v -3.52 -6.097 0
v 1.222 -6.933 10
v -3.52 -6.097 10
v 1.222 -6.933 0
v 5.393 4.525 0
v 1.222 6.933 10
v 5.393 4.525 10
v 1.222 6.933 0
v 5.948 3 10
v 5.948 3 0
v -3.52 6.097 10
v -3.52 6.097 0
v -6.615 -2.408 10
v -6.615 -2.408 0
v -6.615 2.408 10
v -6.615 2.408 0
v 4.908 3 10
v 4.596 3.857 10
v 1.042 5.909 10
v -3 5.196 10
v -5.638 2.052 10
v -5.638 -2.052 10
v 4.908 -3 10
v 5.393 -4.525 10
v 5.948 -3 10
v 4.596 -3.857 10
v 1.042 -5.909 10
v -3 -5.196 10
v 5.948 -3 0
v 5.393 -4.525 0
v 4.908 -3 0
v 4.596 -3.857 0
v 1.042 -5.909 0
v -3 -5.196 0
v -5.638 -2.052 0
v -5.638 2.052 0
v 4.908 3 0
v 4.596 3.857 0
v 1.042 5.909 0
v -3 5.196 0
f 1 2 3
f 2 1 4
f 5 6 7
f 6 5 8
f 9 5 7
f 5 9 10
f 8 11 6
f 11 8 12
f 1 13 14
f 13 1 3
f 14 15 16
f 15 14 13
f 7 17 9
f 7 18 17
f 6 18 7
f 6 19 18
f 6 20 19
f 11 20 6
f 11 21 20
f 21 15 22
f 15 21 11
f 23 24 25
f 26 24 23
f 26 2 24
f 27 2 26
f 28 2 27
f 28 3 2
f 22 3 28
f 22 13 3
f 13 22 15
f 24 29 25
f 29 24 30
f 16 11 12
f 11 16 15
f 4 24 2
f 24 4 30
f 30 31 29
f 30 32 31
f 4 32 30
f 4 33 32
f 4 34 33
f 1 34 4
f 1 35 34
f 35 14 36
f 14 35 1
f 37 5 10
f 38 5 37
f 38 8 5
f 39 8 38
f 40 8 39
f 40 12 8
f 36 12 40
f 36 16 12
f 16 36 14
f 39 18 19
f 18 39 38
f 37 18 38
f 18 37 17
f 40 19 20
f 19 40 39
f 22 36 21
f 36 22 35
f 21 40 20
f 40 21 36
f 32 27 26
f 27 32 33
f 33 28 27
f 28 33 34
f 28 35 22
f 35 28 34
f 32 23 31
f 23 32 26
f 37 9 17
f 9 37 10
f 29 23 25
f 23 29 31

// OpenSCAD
//Thermometer.scad
$fn=9;

hoeheClips=10; //10mm
durchmesserInnenClips=12; //12mm geschätzt noch messen

fiveLines=2.08;

durchmesserAussenClips=durchmesserInnenClips+fiveLines;

difference()
{
difference()
{
cylinder(h=hoeheClips, d=durchmesserAussenClips);

cylinder(h=hoeheClips, d=durchmesserInnenClips);
}

x=14;
translate([0,-durchmesserInnenClips/4,0])
cube([x, durchmesserInnenClips/2, hoeheClips]);
}
